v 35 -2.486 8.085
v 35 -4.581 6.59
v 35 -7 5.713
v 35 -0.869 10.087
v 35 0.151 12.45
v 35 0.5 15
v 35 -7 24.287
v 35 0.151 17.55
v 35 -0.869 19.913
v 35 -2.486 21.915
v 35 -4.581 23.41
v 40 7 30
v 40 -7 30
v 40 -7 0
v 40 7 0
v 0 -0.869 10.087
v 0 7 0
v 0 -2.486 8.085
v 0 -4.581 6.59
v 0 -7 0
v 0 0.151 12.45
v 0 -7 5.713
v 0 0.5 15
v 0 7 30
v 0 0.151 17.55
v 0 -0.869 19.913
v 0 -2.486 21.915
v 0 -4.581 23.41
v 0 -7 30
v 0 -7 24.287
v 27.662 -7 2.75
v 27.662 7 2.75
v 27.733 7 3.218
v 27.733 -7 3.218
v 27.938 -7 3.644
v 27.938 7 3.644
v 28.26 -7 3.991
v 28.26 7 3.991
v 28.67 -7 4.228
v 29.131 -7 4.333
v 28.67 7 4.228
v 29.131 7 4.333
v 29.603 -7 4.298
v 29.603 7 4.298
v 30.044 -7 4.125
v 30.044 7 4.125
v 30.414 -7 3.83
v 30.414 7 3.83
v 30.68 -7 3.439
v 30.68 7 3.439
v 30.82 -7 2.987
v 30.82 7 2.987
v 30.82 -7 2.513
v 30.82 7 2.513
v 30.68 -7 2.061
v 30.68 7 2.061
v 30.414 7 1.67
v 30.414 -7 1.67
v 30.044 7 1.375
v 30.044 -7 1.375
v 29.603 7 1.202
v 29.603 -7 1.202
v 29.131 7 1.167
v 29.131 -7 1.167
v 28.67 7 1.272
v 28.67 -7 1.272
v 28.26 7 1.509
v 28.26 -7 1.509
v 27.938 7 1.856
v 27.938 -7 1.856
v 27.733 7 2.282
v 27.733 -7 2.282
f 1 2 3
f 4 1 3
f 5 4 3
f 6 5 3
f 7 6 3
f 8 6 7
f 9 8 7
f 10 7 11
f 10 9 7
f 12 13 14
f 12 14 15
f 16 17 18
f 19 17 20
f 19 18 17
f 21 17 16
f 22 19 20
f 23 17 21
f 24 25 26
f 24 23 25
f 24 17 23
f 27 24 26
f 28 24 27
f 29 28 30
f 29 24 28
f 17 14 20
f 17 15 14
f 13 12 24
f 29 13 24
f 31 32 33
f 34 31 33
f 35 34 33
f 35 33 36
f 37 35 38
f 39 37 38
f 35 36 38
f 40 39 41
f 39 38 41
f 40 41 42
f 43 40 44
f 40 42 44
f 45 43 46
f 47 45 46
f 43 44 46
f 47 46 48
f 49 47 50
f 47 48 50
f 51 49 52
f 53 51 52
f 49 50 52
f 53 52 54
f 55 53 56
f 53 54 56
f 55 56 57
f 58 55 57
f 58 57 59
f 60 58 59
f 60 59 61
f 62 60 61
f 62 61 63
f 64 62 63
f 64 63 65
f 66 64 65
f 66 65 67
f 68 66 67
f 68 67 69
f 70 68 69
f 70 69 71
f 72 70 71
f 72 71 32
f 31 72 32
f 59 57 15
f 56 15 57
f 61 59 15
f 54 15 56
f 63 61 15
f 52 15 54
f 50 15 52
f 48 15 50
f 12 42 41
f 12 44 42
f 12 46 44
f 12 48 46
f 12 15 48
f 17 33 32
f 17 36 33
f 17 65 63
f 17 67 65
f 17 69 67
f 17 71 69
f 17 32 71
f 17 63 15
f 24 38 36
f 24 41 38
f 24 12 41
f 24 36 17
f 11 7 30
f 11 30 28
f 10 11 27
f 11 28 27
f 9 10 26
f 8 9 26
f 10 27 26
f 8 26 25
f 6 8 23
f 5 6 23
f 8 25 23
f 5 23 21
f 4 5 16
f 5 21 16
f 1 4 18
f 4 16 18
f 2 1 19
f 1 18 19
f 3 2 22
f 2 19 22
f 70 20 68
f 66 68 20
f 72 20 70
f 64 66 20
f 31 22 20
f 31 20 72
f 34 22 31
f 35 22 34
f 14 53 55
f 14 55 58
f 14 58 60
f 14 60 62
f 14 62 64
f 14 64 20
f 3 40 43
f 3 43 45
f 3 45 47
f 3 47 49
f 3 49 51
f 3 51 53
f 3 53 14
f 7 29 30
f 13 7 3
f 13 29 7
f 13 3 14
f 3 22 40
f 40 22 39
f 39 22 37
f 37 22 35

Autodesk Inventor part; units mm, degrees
ref_plane "YZ Plane" through (0, 0, 0) normal (1, 0, 0) x (0, 1, 0)
ref_plane "XZ Plane" through (0, 0, 0) normal (0, 1, 0) x (-1, 0, 0)
ref_plane "XY Plane" through (0, 0, 0) normal (0, 0, 1) x (1, 0, 0)
sketch "Sketch1" plane through (0, 0, 0) normal (0, 0, 1) x (1, 0, 0)
  line L0 (20, -7) -> (-20, -7)
  line L1 (-20, -7) -> (-20, 7)
  line L2 (-20, 7) -> (20, 7)
  line L3 (20, 7) -> (20, -7)
  line L4 (20, -7) -> (-20, 7) construction
  line L5 (-20, -7) -> (20, 7) construction
  point P0 (0, 0)
  dimension "d0" = 40
  dimension "d1" = 14
extrude "Extrusion1" add sketch "Sketch1" along normal blind 30
sketch "Sketch2" plane through (20, -7, 0) normal (1, 0, 0) x (0, 0, -1)
  point P0 (0, 7)
sketch "Sketch3" plane through (20, -7, 0) normal (1, 0, 0) x (0, 0, -1)
  line L0 (0, 0) -> (-30, 0) projected
  line L1 (-15, 0) -> (-15, -2)
  arc A0 (-5.7129, 0) -> (-24.2871, 0) centre (-15, -2) ccw
  point P0 (0, 7)
  dimension "d4" = 2
  dimension "d5" = 19
extrude "Extrusion2" cut sketch "Sketch3" against normal blind 35
sketch "Sketch4" plane through (-20, 7, 0) normal (0, 1, 0) x (1, 0, 0)
  point P0 (20, 0)
sketch "Sketch5" plane through (-20, 7, 0) normal (0, 1, 0) x (1, 0, 0)
  line L0 (40, 0) -> (0, 0) projected
  line L1 (40, -30) -> (0, -30) projected
  line L2 (0, -30) -> (0, -27.25)
  line L3 (0, 0) -> (0, -30) projected
  line L4 (0, -27.25) -> (2.75, -27.25)
  circle A0 centre (2.75, -27.25) radius 2
  line L5 (0, 0) -> (0, -2.75)
  line L6 (0, -2.75) -> (2.75, -2.75)
  circle A1 centre (2.75, -2.75) radius 2
  line L7 (2.75, -27.25) -> (10.75, -27.25)
  circle A2 centre (10.75, -27.25) radius 1.5875
  point P0 (20, 0)
  dimension "d11" = 2.75
  dimension "d12" = 2.75
  dimension "d13" = 4
  dimension "d14" = 2.75
  dimension "d15" = 2.75
  dimension "d16" = 4
  dimension "d17" = 8
  dimension "d18" = 3.175
extrude "Extrusion3" cut sketch "Sketch5" against normal blind 100 contours A2
sketch "Sketch6" plane through (-20, 7, 0) normal (0, 1, 0) x (1, 0, 0)
  point P0 (20, 0)
move or copy body "Move Body1" bodies to move or copy 1 copy no translate (-20, 0, 0)
move or copy body "Move Body2" bodies to move or copy 1 copy no translate (-5, 0, 0)
sketch "Sketch8" plane through (0, 0, 0) normal (1, 0, 0) x (0, 1, 0)
  point P0 (0, 0)
move or copy body "Move Body3" bodies to move or copy 1 copy no rotation origin (0, 0, 0) rotation axis (0, 1, 0) rotation angle 180 translate (-10, 0, 0)
move or copy body "Move Body4" bodies to move or copy 1 copy no translate (5, 0, 0)
move or copy body "Move Body5" bodies to move or copy 1 copy no translate (0, 0, 30)
properties part number "Rb oven housing top"
